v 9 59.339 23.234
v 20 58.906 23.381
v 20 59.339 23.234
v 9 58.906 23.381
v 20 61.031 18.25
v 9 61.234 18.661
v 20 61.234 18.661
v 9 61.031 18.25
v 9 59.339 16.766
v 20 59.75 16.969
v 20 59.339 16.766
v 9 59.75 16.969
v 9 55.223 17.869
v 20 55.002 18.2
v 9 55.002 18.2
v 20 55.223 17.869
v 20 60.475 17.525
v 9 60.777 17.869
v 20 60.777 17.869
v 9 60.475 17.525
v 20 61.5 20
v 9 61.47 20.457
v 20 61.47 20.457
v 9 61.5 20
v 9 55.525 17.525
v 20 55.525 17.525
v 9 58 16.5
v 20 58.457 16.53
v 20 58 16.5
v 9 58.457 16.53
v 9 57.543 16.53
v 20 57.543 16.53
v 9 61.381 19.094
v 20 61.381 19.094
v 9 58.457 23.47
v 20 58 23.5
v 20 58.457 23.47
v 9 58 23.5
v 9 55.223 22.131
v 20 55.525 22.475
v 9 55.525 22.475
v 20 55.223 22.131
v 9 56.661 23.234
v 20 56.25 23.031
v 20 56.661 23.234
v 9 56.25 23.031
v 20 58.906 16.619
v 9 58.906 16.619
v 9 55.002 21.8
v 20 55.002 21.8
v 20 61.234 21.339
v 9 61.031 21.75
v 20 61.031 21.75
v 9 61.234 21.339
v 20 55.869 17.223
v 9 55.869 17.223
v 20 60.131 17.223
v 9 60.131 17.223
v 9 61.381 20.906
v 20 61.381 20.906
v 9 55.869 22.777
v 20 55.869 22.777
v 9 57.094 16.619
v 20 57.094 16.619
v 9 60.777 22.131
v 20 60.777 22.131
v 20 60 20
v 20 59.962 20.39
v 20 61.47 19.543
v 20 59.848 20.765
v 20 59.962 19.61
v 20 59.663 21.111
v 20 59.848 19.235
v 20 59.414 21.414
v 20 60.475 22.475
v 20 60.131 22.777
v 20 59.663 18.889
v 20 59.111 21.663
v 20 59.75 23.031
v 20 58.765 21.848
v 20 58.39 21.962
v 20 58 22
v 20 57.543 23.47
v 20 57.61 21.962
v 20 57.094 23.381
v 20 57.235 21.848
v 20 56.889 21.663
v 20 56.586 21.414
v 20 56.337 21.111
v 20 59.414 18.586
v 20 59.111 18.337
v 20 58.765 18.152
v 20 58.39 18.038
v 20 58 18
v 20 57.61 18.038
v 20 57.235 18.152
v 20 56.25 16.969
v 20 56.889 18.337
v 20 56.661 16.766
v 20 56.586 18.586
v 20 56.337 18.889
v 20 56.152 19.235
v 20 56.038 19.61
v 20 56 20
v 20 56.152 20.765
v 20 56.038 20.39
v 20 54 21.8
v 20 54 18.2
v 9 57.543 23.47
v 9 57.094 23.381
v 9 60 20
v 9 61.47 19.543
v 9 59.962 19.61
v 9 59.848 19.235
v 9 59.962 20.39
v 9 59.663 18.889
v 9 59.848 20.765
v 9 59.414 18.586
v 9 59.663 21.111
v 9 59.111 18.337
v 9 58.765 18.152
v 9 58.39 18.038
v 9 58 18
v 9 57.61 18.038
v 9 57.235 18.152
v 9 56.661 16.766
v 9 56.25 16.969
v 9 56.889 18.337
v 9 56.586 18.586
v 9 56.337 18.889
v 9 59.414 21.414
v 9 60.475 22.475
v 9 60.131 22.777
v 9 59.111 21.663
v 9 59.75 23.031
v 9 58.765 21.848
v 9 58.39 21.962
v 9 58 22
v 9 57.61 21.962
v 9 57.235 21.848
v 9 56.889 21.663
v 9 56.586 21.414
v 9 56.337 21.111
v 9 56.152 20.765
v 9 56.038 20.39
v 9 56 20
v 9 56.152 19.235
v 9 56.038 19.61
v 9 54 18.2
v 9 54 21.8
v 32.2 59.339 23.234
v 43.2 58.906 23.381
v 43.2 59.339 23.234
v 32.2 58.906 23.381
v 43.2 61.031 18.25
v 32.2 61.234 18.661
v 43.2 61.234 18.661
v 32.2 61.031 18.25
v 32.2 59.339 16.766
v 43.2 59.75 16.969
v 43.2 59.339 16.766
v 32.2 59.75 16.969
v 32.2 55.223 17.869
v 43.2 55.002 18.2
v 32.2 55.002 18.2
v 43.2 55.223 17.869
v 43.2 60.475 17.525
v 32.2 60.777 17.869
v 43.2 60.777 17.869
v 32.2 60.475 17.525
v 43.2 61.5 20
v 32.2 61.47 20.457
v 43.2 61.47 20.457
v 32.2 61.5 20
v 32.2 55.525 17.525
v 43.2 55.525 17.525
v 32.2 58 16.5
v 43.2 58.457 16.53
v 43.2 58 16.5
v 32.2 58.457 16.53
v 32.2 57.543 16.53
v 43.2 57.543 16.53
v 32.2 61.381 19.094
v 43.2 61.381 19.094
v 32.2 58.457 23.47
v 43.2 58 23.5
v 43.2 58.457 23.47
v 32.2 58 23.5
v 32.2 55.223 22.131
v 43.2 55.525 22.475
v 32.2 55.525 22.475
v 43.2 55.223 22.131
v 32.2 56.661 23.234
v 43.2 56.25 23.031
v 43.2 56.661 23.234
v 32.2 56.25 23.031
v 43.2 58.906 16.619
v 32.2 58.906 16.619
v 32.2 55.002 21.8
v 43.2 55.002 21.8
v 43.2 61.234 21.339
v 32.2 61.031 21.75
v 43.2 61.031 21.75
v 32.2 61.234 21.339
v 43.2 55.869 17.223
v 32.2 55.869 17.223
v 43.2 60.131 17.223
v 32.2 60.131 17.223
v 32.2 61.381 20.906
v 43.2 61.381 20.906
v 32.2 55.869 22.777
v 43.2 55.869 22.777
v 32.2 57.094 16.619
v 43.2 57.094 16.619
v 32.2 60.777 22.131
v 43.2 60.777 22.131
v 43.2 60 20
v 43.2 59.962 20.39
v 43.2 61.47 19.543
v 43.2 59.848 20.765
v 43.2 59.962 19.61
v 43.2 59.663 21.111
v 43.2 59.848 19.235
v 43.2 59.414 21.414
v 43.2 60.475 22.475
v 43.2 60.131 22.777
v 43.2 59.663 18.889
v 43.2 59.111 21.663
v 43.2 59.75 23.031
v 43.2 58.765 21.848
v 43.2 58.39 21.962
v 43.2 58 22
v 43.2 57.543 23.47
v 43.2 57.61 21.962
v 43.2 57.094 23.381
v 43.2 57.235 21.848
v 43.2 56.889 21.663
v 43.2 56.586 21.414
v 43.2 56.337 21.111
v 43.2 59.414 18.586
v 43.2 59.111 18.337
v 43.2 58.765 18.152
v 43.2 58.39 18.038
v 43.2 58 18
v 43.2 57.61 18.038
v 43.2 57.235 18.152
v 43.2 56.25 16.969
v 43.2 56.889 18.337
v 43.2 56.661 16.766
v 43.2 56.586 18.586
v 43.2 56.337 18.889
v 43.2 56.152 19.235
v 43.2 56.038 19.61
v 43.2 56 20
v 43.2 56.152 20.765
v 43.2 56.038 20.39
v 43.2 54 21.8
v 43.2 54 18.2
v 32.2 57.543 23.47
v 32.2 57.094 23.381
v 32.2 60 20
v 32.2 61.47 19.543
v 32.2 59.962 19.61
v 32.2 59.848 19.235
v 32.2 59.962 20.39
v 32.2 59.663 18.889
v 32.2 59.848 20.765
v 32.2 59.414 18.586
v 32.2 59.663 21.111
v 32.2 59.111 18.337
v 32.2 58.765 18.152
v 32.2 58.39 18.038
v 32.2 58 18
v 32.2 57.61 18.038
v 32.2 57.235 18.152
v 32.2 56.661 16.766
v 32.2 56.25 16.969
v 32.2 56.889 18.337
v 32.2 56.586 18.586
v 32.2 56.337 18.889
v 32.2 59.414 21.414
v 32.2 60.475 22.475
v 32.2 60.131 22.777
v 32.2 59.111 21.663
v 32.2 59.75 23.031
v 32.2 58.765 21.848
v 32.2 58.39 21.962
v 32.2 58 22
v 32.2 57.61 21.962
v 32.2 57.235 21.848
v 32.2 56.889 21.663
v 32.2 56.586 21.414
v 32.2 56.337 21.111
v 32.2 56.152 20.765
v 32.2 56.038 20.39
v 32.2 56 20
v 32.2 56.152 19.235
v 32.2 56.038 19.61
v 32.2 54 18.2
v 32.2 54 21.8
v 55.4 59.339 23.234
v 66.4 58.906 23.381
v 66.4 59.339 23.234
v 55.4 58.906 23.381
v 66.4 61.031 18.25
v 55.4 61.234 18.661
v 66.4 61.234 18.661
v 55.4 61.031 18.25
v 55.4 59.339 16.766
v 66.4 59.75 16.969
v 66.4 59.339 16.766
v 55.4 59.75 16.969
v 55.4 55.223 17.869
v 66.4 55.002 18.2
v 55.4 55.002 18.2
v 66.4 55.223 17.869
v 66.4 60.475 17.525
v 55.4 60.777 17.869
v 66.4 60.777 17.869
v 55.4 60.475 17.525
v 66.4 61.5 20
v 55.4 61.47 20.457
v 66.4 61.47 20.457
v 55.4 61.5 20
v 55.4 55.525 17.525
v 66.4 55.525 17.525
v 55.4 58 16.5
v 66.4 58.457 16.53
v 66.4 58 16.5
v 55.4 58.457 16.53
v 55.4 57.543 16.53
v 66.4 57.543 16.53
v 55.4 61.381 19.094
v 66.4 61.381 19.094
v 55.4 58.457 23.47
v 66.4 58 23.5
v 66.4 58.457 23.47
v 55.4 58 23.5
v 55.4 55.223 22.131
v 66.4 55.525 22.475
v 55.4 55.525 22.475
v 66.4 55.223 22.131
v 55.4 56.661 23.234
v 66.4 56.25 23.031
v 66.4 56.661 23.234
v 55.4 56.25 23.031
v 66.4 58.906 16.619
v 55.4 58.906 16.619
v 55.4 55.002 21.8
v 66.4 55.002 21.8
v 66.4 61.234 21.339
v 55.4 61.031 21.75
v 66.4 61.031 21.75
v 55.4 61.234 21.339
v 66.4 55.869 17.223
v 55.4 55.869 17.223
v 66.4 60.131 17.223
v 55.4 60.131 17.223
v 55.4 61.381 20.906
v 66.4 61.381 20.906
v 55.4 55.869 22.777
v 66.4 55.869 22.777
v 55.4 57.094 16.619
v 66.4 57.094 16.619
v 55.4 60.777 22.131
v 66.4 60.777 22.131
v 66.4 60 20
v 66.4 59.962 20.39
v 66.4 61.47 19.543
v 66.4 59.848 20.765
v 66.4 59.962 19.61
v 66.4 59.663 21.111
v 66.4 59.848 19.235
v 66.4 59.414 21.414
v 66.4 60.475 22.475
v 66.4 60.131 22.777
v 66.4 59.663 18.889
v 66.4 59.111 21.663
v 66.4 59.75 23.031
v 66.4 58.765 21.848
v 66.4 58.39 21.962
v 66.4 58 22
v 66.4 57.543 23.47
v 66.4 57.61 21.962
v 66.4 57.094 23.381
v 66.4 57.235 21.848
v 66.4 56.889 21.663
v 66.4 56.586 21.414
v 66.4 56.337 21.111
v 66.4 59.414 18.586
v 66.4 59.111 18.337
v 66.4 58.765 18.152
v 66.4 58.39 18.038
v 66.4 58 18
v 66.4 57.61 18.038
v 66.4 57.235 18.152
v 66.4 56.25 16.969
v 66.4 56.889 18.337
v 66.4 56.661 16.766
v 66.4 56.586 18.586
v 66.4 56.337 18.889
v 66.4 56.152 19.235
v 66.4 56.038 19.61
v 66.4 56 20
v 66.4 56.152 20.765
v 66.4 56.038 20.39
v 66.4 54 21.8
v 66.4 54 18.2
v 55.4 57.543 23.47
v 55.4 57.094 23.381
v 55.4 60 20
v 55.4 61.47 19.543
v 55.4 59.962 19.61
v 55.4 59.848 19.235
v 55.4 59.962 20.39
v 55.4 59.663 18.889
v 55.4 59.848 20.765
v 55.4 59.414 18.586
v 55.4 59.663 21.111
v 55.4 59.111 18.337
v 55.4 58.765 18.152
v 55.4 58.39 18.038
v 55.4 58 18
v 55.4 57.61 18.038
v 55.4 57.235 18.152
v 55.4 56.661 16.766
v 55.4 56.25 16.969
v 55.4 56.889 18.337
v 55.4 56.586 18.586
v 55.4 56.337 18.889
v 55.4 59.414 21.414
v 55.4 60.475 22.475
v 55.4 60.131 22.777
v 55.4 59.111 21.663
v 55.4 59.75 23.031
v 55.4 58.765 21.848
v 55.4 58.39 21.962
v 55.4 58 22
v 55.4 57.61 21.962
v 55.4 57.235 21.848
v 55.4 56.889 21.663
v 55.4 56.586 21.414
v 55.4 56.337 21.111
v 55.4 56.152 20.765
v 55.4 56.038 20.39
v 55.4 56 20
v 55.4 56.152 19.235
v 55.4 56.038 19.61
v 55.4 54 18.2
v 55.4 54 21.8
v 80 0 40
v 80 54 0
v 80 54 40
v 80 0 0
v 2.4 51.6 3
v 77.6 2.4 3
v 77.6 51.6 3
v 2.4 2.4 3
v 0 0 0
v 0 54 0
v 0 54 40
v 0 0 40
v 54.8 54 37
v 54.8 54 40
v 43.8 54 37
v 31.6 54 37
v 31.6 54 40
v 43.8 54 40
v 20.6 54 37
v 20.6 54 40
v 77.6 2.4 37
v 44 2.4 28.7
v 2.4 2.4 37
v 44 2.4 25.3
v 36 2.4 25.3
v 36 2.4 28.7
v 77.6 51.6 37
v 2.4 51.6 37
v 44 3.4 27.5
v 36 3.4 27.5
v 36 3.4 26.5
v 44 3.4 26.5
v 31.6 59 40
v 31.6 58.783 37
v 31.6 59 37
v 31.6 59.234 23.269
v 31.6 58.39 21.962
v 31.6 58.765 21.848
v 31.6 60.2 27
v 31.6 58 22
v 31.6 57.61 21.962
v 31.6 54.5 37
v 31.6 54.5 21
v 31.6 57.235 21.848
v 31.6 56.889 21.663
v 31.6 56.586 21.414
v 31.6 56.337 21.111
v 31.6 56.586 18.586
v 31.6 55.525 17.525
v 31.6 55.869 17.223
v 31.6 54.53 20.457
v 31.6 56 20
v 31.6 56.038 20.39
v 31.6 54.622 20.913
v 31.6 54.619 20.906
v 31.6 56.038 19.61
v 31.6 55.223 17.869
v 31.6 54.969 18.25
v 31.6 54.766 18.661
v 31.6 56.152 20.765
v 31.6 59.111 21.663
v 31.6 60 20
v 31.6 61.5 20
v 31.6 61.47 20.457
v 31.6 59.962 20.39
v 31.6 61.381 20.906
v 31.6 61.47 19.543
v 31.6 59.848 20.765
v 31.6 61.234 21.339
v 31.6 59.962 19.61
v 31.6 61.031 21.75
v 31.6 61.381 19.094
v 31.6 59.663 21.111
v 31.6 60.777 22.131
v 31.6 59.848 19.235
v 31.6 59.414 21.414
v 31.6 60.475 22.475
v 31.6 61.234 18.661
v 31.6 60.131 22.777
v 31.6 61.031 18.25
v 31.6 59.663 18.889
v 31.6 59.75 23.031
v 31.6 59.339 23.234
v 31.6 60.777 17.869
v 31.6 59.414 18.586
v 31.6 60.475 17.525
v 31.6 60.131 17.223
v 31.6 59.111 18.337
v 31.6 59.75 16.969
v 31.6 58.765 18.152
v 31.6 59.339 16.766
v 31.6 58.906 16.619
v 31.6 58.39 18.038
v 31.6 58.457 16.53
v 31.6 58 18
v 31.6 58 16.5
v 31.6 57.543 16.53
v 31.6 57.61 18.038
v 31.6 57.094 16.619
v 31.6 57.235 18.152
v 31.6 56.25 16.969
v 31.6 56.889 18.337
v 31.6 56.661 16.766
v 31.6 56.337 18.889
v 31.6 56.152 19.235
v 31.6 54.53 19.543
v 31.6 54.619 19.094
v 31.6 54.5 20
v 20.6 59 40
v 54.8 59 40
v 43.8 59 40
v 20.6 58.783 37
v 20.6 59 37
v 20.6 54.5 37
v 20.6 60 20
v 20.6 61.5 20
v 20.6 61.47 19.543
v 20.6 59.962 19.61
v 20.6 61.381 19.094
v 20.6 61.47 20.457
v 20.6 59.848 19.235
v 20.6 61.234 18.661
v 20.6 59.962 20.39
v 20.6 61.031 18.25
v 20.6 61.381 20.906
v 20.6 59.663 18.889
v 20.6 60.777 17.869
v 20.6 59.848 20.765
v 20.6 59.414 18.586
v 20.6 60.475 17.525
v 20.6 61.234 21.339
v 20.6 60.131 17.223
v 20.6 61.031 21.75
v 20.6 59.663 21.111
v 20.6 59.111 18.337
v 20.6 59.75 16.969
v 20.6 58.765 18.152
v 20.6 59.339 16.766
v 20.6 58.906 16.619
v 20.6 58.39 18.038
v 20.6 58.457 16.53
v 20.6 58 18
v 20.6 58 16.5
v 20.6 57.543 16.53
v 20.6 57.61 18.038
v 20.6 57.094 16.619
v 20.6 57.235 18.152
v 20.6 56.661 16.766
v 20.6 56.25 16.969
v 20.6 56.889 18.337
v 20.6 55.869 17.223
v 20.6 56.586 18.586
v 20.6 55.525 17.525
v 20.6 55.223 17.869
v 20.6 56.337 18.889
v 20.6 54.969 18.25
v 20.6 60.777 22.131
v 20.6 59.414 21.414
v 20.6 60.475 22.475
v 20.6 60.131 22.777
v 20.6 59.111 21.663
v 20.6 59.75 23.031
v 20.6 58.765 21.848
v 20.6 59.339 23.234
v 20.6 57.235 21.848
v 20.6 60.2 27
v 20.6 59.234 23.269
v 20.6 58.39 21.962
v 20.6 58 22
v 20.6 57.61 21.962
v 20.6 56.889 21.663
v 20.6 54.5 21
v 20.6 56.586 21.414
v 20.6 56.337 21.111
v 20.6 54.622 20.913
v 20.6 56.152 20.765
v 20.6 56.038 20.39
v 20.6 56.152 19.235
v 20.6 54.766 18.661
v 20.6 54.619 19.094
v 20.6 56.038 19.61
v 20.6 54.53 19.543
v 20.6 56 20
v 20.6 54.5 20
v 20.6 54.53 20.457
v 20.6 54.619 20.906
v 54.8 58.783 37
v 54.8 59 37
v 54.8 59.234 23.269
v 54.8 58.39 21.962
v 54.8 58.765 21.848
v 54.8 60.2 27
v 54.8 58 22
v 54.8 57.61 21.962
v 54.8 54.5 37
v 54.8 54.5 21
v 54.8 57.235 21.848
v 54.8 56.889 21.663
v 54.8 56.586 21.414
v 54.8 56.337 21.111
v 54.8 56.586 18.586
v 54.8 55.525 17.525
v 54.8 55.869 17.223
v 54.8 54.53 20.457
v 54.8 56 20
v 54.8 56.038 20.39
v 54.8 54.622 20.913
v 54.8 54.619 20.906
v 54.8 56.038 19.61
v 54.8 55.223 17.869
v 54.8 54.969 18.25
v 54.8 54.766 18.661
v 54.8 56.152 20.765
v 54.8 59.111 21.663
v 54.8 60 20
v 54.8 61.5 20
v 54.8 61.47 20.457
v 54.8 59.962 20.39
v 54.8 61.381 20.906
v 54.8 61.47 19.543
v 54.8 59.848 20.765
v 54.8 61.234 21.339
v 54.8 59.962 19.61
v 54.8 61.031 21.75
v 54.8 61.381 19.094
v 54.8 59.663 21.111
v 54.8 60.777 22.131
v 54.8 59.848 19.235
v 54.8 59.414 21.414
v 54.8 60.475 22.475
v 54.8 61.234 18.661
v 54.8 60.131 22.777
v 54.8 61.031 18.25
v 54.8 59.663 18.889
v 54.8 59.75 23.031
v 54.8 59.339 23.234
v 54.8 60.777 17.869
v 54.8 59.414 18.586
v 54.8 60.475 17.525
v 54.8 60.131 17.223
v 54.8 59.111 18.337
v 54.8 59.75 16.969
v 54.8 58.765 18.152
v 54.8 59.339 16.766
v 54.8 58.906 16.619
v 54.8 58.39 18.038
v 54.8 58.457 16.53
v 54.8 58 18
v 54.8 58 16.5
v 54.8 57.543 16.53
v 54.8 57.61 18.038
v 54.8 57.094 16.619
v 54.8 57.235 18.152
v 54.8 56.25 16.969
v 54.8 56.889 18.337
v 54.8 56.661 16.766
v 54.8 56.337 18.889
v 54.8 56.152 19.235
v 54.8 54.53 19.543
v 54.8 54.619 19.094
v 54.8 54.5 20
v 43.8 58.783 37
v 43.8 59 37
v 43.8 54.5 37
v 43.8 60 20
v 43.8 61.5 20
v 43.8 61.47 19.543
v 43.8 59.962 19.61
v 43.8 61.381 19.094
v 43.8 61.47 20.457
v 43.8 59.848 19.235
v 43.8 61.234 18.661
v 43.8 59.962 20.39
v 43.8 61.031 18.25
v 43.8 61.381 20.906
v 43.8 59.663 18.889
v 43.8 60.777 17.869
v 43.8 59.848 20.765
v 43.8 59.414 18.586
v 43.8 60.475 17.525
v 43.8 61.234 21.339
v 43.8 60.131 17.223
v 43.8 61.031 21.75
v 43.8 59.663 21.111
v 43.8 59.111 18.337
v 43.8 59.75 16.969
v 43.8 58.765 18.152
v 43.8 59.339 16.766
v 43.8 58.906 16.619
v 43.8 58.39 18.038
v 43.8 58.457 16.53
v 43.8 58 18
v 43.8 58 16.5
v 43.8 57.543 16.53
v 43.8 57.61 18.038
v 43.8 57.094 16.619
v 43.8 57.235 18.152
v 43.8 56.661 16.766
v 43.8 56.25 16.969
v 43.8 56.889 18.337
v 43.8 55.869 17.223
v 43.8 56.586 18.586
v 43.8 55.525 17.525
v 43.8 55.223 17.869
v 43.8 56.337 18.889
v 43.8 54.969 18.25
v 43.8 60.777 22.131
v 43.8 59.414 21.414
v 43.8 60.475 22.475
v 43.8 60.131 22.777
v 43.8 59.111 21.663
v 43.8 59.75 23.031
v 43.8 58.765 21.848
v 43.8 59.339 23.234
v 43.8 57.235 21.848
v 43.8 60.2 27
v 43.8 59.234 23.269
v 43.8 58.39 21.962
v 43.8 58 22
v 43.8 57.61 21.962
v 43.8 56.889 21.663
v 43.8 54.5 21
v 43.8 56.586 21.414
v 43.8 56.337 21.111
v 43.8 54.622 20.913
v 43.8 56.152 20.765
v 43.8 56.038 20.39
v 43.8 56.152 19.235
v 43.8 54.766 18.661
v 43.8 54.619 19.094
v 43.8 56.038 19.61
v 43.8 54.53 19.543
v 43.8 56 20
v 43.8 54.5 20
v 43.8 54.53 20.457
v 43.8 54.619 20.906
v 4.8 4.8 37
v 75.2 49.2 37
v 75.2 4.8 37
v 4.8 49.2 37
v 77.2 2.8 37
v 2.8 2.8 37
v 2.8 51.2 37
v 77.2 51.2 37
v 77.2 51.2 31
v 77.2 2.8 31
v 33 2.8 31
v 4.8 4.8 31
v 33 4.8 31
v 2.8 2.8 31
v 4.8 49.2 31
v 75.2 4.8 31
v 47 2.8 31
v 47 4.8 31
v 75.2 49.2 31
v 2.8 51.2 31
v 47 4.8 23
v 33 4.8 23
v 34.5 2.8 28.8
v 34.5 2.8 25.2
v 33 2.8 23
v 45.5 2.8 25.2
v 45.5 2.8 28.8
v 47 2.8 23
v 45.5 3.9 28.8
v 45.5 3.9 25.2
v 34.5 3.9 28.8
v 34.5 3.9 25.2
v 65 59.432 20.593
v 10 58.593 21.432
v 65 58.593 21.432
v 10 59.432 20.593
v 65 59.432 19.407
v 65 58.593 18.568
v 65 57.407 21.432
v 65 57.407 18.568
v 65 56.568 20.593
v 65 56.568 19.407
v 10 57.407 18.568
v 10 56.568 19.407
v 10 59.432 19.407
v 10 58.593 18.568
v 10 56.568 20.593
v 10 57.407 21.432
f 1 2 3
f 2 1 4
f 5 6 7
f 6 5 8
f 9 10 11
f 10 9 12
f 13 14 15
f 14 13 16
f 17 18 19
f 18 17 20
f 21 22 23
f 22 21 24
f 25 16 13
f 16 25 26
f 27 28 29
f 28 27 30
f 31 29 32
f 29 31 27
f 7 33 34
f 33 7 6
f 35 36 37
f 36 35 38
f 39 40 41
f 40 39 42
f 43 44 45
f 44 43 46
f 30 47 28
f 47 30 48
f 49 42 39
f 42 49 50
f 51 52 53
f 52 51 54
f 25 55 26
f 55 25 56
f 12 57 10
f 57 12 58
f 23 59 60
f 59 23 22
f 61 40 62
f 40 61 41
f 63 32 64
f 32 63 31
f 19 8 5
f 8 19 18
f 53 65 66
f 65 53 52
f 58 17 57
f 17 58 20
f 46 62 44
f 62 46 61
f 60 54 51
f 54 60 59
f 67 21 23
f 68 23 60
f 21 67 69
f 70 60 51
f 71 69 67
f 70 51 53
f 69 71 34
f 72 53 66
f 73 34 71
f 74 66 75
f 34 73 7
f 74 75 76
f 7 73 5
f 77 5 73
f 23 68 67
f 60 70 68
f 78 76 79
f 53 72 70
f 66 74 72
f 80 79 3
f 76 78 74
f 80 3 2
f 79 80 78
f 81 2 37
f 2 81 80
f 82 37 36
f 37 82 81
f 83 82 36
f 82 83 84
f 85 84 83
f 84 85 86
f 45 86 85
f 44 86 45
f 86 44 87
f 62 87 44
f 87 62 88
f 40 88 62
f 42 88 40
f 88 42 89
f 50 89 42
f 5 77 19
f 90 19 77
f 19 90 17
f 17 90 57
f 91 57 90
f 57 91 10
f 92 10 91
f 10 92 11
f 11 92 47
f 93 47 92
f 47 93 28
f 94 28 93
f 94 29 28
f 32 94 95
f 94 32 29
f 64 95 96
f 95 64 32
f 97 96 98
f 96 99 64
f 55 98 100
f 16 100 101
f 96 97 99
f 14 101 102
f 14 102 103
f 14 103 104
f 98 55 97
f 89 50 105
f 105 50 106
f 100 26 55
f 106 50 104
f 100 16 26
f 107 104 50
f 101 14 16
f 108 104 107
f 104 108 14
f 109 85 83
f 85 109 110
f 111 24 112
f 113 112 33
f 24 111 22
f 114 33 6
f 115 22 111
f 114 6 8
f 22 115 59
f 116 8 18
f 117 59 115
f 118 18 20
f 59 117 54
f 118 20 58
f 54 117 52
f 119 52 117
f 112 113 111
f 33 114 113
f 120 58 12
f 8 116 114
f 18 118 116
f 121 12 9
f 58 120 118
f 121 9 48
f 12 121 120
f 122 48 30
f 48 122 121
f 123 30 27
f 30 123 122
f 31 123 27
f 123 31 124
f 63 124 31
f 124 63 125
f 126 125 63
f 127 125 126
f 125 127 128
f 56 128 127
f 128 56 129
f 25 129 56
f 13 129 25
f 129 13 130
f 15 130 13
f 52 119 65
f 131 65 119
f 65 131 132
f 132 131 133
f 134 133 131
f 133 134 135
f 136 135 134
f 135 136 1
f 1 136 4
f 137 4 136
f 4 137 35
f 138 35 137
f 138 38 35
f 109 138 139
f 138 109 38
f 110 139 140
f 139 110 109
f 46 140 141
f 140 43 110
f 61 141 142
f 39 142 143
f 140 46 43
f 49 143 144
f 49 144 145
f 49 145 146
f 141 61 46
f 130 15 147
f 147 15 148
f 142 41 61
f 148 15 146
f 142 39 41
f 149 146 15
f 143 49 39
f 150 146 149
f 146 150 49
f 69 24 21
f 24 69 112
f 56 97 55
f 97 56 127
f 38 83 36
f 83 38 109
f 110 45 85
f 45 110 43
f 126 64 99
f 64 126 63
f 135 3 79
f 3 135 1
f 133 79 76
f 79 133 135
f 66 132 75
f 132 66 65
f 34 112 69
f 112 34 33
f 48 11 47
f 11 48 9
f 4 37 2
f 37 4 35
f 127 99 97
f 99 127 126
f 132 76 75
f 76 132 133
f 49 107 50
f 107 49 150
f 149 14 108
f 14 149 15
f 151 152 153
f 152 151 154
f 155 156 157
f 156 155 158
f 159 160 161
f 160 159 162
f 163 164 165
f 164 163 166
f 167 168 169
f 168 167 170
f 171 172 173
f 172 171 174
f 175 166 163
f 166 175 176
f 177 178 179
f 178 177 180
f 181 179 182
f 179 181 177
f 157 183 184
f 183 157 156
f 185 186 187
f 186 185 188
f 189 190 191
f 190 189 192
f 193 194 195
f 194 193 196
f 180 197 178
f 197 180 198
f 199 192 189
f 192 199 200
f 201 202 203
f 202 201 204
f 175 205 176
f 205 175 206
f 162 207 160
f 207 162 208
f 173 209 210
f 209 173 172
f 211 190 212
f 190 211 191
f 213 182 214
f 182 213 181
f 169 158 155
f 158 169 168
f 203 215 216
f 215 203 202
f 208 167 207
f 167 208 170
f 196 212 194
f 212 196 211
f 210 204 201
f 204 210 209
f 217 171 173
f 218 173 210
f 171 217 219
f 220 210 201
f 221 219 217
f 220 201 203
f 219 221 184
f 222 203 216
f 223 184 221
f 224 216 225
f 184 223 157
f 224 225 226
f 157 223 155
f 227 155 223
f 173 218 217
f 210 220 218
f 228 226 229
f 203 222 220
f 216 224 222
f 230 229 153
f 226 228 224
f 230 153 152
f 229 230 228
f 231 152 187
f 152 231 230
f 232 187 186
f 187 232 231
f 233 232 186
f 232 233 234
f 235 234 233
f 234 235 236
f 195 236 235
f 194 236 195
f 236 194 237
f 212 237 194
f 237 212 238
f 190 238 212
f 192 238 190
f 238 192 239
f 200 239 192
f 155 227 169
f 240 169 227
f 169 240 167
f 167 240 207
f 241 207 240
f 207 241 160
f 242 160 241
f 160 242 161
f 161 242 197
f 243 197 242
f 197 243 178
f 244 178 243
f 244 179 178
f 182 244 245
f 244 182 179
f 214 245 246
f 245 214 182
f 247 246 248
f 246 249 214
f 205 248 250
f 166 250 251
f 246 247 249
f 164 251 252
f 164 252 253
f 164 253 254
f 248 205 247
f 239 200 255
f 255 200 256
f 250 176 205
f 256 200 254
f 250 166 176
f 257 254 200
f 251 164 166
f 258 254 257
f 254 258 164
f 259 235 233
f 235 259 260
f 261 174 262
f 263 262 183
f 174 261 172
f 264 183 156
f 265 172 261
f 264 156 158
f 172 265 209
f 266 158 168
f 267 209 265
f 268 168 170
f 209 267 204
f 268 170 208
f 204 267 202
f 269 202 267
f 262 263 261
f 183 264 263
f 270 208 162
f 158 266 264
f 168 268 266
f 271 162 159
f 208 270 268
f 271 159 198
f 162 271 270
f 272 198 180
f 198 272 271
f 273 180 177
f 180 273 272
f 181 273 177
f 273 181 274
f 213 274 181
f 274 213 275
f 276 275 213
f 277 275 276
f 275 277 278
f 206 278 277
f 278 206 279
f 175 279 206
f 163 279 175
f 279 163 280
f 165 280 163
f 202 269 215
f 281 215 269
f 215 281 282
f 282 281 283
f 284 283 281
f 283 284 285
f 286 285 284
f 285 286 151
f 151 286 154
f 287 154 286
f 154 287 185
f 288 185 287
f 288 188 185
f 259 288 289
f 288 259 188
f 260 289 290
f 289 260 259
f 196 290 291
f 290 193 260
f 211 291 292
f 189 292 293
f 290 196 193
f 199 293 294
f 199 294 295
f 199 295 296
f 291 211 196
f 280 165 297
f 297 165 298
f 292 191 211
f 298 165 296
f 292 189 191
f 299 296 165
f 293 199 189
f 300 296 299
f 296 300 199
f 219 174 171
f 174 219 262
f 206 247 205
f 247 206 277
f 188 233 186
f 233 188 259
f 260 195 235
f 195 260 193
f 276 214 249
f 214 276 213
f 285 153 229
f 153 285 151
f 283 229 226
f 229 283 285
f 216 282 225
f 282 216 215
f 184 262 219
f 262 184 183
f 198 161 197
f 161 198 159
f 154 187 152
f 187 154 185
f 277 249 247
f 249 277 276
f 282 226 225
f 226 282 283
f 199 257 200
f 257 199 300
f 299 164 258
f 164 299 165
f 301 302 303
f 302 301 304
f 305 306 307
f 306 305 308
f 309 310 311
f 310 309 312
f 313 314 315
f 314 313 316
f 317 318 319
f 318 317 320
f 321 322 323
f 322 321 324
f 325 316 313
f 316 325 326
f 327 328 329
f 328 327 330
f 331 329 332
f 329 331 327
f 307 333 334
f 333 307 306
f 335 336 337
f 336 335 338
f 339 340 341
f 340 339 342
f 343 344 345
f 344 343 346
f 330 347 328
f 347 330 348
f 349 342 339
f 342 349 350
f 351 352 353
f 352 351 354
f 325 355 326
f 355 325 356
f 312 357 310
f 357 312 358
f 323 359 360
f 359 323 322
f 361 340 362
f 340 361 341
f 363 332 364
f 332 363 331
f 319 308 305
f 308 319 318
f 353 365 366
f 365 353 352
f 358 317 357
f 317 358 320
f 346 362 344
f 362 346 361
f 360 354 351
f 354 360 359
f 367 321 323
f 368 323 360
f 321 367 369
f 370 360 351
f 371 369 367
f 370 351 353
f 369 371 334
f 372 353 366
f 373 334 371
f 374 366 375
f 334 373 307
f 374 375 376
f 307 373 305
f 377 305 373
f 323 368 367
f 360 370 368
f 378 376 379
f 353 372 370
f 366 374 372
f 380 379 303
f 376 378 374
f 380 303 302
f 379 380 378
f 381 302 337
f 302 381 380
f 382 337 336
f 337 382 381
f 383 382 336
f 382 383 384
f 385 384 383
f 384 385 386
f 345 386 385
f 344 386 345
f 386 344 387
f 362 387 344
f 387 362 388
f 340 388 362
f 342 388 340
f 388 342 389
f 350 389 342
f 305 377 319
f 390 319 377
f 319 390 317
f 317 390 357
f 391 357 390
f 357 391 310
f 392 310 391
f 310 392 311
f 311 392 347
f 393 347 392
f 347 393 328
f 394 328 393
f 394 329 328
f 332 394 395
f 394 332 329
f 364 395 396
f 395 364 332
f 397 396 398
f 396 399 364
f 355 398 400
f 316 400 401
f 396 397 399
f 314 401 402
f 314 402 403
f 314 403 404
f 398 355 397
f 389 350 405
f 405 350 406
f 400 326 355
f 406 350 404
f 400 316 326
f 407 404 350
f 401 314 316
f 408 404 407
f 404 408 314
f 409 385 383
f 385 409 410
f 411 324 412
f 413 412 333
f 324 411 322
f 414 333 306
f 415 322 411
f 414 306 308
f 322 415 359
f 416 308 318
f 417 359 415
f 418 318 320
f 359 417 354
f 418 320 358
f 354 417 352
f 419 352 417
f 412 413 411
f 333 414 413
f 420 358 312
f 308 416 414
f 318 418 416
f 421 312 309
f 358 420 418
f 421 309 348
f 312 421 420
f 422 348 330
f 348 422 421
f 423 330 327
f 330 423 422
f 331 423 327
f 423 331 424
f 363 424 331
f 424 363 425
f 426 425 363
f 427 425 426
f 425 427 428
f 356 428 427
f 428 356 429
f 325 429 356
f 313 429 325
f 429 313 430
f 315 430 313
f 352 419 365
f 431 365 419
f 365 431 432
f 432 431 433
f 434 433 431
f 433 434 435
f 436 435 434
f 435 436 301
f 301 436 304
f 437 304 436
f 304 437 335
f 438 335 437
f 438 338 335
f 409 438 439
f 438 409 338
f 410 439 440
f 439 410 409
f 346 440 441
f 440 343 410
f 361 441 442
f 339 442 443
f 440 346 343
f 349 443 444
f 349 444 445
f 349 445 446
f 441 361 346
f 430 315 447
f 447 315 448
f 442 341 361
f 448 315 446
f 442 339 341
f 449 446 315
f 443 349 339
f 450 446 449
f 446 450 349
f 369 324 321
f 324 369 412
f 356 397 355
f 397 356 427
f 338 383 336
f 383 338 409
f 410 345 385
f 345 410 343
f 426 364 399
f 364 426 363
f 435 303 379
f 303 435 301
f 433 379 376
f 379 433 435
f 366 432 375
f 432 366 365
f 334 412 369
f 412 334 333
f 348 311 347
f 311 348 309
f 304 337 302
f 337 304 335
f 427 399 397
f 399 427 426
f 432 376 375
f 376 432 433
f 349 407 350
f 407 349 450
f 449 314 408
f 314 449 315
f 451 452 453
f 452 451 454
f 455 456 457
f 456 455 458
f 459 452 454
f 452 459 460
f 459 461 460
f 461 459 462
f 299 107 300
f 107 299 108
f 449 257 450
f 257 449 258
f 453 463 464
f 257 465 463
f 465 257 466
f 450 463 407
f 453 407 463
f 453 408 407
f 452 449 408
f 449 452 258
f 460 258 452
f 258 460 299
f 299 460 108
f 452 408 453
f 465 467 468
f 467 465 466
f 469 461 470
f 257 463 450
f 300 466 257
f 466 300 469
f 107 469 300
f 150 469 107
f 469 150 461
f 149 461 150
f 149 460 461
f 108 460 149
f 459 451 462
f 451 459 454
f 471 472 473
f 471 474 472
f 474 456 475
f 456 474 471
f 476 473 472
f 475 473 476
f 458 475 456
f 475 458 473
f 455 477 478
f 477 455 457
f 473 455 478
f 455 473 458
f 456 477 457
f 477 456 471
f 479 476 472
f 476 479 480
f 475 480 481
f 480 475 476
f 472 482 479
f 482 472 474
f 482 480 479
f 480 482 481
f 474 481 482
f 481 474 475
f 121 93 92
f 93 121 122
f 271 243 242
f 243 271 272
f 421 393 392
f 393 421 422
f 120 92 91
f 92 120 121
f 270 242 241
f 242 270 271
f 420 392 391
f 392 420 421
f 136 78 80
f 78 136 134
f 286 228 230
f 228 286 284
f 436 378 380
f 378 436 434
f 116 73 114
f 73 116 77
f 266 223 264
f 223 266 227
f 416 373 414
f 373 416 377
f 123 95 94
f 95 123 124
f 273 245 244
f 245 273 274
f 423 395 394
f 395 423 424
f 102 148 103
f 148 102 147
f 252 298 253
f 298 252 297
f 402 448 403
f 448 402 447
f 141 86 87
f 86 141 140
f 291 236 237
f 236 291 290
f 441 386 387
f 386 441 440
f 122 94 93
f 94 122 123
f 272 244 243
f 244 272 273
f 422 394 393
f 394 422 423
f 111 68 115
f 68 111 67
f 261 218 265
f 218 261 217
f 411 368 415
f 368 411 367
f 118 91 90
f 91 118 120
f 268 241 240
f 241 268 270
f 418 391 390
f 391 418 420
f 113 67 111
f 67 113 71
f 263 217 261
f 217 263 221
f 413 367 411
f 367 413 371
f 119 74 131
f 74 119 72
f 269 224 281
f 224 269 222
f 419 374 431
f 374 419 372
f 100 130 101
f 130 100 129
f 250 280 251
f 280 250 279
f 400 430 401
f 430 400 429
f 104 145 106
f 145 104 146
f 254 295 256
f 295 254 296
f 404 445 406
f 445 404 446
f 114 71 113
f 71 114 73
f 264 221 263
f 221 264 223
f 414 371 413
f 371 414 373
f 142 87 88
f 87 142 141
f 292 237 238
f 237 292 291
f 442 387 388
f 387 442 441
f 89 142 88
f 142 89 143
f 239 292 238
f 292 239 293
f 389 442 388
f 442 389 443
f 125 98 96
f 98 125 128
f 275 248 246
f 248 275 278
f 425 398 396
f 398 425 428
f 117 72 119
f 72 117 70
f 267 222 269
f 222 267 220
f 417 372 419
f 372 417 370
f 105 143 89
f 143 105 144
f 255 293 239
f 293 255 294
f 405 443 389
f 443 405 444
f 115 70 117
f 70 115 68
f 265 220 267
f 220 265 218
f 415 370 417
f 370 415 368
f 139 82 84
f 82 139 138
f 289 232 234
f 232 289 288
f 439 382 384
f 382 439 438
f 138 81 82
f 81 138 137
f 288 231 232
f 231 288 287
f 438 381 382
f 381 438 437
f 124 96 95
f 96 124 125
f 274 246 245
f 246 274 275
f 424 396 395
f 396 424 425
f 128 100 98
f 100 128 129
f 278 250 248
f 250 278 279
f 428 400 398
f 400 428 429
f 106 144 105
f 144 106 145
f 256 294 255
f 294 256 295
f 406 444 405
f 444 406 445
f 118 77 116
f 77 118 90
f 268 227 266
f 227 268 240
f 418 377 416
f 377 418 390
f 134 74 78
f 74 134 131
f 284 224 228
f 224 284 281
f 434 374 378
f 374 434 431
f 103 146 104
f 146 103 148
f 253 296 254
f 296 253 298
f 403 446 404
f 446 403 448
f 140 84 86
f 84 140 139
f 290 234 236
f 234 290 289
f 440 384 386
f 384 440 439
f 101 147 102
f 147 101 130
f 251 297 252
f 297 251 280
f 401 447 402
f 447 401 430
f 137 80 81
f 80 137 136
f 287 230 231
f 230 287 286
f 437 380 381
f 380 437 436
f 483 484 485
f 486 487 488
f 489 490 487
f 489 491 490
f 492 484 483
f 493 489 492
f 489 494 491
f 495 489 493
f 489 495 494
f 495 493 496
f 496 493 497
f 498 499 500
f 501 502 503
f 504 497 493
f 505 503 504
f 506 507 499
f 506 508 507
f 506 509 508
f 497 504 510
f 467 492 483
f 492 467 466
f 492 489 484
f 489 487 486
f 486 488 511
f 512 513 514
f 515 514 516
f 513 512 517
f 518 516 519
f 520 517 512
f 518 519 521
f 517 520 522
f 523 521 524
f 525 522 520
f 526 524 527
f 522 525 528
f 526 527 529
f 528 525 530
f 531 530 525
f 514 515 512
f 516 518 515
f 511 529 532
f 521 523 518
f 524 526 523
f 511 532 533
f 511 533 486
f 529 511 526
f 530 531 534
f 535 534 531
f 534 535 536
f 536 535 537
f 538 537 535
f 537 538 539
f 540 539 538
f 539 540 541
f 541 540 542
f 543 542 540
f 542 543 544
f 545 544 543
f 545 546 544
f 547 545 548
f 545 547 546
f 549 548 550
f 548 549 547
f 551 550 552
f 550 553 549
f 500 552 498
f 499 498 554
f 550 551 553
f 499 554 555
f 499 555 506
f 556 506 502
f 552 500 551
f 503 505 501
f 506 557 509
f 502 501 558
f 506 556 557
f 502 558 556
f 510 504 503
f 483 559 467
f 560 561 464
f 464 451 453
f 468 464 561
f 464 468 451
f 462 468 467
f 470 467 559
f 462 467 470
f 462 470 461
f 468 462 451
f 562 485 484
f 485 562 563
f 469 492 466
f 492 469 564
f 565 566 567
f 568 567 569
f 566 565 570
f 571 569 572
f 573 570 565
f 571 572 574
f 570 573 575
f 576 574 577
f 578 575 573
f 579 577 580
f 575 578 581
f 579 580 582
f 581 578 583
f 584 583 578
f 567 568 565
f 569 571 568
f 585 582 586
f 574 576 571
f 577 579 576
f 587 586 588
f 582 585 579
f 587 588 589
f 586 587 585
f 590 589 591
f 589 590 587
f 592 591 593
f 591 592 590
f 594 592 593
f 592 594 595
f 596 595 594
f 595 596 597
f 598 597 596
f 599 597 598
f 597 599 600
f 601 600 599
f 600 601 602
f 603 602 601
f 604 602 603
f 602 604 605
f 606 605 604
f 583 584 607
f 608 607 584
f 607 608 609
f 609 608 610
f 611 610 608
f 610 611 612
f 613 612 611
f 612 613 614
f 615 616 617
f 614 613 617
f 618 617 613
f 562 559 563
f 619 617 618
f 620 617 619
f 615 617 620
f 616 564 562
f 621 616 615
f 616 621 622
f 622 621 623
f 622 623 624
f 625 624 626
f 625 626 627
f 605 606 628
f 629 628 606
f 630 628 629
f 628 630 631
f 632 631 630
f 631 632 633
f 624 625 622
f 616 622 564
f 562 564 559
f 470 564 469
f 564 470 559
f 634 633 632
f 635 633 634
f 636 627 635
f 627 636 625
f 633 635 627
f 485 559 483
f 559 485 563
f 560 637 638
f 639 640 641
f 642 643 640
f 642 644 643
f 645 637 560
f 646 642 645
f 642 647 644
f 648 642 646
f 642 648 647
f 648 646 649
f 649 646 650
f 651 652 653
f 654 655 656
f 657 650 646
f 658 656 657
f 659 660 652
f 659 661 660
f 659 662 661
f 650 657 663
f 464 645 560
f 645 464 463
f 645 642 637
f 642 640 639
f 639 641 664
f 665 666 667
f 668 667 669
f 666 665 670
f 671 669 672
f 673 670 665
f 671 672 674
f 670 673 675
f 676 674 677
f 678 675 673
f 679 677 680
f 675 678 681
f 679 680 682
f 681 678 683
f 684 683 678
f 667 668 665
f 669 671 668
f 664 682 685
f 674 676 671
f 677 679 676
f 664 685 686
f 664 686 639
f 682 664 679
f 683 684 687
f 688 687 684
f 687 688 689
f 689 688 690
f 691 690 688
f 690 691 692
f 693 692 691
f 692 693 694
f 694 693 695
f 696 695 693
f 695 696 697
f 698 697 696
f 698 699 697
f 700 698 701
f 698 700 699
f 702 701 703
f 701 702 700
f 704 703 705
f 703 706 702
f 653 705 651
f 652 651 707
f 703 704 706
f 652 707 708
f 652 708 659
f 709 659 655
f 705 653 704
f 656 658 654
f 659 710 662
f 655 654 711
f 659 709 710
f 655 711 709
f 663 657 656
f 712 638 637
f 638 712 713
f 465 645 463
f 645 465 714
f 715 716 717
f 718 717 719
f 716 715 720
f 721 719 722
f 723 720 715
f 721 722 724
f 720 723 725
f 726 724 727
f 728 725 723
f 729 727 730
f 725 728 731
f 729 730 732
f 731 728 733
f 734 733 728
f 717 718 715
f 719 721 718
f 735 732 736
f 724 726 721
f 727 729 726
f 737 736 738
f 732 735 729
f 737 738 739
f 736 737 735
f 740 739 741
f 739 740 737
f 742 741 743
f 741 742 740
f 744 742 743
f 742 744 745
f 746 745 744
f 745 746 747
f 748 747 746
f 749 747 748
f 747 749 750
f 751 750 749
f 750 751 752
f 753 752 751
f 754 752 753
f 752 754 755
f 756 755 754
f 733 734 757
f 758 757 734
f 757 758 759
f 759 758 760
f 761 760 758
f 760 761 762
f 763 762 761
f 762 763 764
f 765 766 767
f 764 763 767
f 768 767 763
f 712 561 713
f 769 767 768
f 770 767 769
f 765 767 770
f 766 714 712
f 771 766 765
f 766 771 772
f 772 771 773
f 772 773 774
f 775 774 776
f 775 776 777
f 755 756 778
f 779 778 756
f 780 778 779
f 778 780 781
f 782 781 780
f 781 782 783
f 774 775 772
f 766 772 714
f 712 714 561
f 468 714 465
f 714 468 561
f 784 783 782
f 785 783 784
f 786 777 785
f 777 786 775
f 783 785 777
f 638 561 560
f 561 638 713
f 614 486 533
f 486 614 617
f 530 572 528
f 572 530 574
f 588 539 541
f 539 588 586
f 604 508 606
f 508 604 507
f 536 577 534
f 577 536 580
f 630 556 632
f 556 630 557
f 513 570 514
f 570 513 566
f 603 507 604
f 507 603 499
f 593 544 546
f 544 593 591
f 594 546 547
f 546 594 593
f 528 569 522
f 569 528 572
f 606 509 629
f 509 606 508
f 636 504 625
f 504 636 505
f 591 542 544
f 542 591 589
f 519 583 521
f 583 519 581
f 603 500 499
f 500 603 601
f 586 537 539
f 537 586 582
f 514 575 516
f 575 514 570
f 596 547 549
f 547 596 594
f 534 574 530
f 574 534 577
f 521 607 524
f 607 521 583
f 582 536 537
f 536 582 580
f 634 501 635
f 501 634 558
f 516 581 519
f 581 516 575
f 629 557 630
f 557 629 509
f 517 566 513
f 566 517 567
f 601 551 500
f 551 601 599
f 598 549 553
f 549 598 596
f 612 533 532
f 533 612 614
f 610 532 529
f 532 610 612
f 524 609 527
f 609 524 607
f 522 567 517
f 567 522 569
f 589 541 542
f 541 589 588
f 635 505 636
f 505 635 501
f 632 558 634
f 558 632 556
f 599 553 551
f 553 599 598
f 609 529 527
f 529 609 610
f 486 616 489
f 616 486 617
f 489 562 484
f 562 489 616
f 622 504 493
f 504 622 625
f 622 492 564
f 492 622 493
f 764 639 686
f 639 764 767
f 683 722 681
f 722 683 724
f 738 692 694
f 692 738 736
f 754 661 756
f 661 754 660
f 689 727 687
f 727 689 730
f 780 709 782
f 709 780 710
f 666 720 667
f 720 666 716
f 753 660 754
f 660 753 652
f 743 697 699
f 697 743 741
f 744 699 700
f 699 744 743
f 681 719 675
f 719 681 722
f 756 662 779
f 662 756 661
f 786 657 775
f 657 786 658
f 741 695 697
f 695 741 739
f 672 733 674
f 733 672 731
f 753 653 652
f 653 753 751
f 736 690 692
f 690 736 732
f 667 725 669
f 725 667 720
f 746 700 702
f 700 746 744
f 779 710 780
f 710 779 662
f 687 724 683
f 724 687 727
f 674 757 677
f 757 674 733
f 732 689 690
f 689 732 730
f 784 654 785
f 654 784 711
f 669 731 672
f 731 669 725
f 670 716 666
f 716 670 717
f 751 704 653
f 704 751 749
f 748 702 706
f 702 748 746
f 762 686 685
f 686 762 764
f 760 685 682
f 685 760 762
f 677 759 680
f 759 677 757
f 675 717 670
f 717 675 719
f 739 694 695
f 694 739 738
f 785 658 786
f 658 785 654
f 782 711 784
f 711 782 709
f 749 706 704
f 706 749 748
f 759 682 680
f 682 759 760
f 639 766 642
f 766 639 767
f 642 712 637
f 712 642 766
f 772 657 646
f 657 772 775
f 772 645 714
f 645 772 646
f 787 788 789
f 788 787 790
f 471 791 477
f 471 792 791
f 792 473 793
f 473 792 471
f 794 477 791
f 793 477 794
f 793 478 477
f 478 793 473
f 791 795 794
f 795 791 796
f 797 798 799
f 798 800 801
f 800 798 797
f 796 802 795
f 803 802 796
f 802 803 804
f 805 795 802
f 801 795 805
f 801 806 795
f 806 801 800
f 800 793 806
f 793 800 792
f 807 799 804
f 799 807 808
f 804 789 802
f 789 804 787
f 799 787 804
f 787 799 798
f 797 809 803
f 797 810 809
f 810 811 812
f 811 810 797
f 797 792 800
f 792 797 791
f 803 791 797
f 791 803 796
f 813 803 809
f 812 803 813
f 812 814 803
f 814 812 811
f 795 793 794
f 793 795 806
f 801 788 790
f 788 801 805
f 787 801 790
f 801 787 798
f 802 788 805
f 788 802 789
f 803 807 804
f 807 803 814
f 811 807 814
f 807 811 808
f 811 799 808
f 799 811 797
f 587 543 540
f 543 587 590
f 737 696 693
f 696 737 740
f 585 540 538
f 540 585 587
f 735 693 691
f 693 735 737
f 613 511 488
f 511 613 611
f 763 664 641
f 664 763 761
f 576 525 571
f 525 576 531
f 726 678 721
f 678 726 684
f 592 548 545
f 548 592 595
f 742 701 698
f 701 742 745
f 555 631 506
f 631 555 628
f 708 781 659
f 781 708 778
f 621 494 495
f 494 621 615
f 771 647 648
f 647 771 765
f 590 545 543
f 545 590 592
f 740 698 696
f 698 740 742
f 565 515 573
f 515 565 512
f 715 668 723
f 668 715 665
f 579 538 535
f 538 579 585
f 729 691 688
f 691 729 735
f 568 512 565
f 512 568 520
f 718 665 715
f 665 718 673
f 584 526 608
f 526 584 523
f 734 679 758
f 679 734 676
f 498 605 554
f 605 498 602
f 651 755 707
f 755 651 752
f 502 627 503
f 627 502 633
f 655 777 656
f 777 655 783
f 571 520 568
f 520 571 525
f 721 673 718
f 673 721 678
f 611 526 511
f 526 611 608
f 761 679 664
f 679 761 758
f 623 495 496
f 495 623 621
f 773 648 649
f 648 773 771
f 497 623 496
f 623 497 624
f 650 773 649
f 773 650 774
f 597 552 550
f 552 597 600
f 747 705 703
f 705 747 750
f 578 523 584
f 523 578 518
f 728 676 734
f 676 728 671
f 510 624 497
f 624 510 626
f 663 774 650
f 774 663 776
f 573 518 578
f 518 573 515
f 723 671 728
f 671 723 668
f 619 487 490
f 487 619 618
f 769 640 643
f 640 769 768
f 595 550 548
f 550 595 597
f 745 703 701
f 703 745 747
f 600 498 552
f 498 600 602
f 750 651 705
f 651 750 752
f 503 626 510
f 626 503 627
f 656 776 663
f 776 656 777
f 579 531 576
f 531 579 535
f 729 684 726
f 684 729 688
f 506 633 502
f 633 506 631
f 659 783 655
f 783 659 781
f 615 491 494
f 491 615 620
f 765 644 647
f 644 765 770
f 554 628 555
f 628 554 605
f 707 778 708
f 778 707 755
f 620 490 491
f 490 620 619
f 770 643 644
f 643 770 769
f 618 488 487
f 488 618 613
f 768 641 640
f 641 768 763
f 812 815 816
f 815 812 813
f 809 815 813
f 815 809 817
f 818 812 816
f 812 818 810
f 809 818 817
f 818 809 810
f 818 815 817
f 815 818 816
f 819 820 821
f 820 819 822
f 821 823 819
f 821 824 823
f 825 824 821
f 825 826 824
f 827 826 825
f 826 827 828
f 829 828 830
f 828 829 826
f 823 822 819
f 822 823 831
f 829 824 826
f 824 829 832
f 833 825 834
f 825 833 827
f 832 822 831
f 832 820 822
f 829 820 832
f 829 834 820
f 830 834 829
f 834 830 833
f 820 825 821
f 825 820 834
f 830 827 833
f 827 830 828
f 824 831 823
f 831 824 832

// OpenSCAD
// Box with print-in-place hinge
// Closed body 80 (x) x 54 (y body, 61.5 incl. hinge) x 40 (z) mm.
// Lid occupies the top 10 mm. Hinge pin axis: y=58, z=20 (mid-height at the
// back), so swinging the lid -180 deg about that axis lays the lid flat on
// the bed behind the box: that is the print-in-place pose.
// Clearances (PLA, 0.4 nozzle): pin/bore 0.40 radial, knuckle axial gaps
// 0.6, lid lip to box walls 0.4, lid barrels to box back wall 0.5.

part = "assembly"; // [assembly, box, lid, pin]
cadverify_only = "";

W = 80; D = 54; H = 40; box_h = 30;
wall = 2.4; floor_t = 3; plate_t = 3;
hinge_y = 58; hinge_z = 20;
barrel_r = 3.5; bore_r = 2.0; pin_r = 1.55; cap_r = 2.9;
hinge_ymax = hinge_y + barrel_r;          // 61.5
box_segs  = [[9, 11], [32.2, 11], [55.4, 11]];   // [x0, len]
lid_segs  = [[20.6, 11], [43.8, 11]];
pin_x0 = 10; pin_len = 55;

module instance(name, partname, unit = 1) {
    echo(cadverify_instance = [name, partname, unit]);
    if (cadverify_only == "" || cadverify_only == name) children();
}

// Extrude a (y,z) profile along +x starting at x0, offset by (oy,oz).
module extrude_yz(profile, x0, len, oy = 0, oz = 0) {
    multmatrix([[0,0,1,x0],[1,0,0,oy],[0,1,0,oz],[0,0,0,1]])
        linear_extrude(height = len) polygon(points = profile);
}

module barrel(x0, len) {
    translate([x0, hinge_y, hinge_z]) rotate([0, 90, 0])
        cylinder(h = len, r = barrel_r, $fn = 48);
}

module bore_cut() {
    translate([4, hinge_y, hinge_z]) rotate([0, 90, 0])
        cylinder(h = 72, r = bore_r, $fn = 32);
}

module box_closed() {
    difference() {
        union() {
            // floor and walls up to z=30
            translate([0, 0, 0]) cube([W, D, floor_t]);
            translate([0, 0, floor_t]) cube([W, wall, box_h - floor_t]);              // front
            translate([0, D - wall, floor_t]) cube([W, wall, box_h - floor_t]);       // back
            translate([0, wall, floor_t]) cube([wall, D - 2*wall, box_h - floor_t]);  // left
            translate([W - wall, wall, floor_t]) cube([wall, D - 2*wall, box_h - floor_t]); // right
            // front catch detent bump on the inner front wall (wedged ridge)
            extrude_yz([[2.4,25.3],[3.4,26.5],[3.4,27.5],[2.4,28.7]], 36, 8);
            // hinge knuckles + arms to the back wall
            for (s = box_segs) {
                barrel(s[0], s[1]);
                translate([s[0], 53.5, hinge_z - 1.8]) cube([s[1], 5, 3.6]);
            }
        }
        bore_cut();
    }
}

module lid_closed() {
    difference() {
        union() {
            // top plate + back hinge tabs
            translate([0, 0, H - plate_t]) cube([W, D, plate_t]);
            for (s = lid_segs) translate([s[0], 53, H - plate_t]) cube([s[1], 6, plate_t]);
            // external skirt (down to z=30, flush with box walls outside)
            translate([0, 0, box_h]) cube([W, wall, H - plate_t - box_h]);                  // front
            translate([0, D - wall, box_h]) cube([W, wall, H - plate_t - box_h]);           // back
            translate([0, wall, box_h]) cube([wall, D - 2*wall, H - plate_t - box_h]);      // left
            translate([W - wall, wall, box_h]) cube([wall, D - 2*wall, H - plate_t - box_h]); // right
            // inner sealing lip (0.4 clear of box inner walls)
            translate([2.8, 2.8, 31]) cube([74.4, 2, 6]);        // front lip
            translate([2.8, 49.2, 31]) cube([74.4, 2, 6]);       // back lip
            translate([2.8, 4.8, 31]) cube([2, 44.4, 6]);        // left lip
            translate([75.2, 4.8, 31]) cube([2, 44.4, 6]);       // right lip
            // central catch tongue on the front lip, reaching down to z=23
            translate([33, 2.8, 23]) cube([14, 2, 8]);
            // hinge knuckles + diagonal straps up to the plate tabs
            for (s = lid_segs) {
                barrel(s[0], s[1]);
                extrude_yz([[54.5,39],[58.5,39],[60.2,27],[58,18.5],[54.5,21]], s[0], s[1]);
            }
        }
        bore_cut();
        // catch groove in the tongue (receives the box detent bump when shut)
        translate([34.5, 2.7, 25.2]) cube([11, 1.2, 3.6]);
        // fingernail scoop in the front skirt bottom edge
        translate([40, -1, box_h]) rotate([90, 0, 0]) cylinder(h = 4, r = 4.5, $fn = 32);
    }
}

function oct_pts(r) = [for (i = [0:7]) let (a = 22.5 + 45*i) [r*cos(a), r*sin(a)]];

module pin_closed() {
    // plain octagonal axle (flats top/bottom), ends protrude past the outer knuckles
    extrude_yz(oct_pts(pin_r), pin_x0, pin_len, hinge_y, hinge_z);
}

// --- printed (as-exported) orientations ---
module lid_printed() {
    // closed lid rotated 180 deg about the hinge axis, then dropped to y=0
    translate([0, hinge_ymax, H]) rotate([180, 0, 0]) lid_closed();
}
pin_off = pin_r * cos(22.5); // 1.432 half-height of the octagonal shaft
module pin_printed() {
    translate([-pin_x0, -(hinge_y - pin_off), -(hinge_z - pin_off)]) pin_closed();
}

box_spec = [
    ["bounds", [[0, 0, 0], [W, hinge_ymax, box_h]]],
    ["bodies", 1],
    ["support_faces", [["bed", "-z", 4000]]],
    ["overhangs_allowed", [
        ["hinge barrels and arms: horizontal print-in-place axle housings, bore is self-supported inside the tube", [[8, 53, 16], [67.5, 62, 24]]]
    ]],
    ["copies", 1],
    ["details", [
        ["floor", "material", [[10, 10, 0.5], [70, 44, 2.5]], 0.98],
        ["interior", "void", [[6, 6, 8], [74, 48, 24]], 0.98],
        ["front_wall", "thickness", [40, -1, 15], [0, 1, 0], 2.4],
        ["knuckle_arm", "material", [[10, 53.8, 18.8], [19, 55.8, 21.2]], 0.9],
        ["hinge_bore", "void", [[10, 56.7, 18.7], [19, 59.3, 21.3]], 1.0],
        ["catch_bump", "material", [[37, 2.6, 26.6], [43, 3.3, 27.4]], 0.85],
        ["catch_bump_view", "view", [[35, 2, 24], [45, 4.5, 29.5]]],
        ["hinge_view", "view", [[8, 53, 15], [67, 62, 25]]]
    ]]
];

lid_spec = [
    ["bounds", [[0, 0, 0], [W, hinge_ymax, 23.5]]],
    ["bodies", 1],
    ["support_faces", [["bed", "-z", 4000]]],
    ["overhangs_allowed", [
        ["hinge barrels and straps: horizontal print-in-place axle housings", [[20, 0, 0], [55.5, 8, 24]]],
        ["catch groove underside in print pose", [[34, 56, 11], [46, 59, 15]]]
    ]],
    ["copies", 1],
    ["details", [
        ["top_plate", "material", [[10, 17.5, 0.5], [70, 51.5, 2.5]], 0.98],
        ["front_skirt", "material", [[10, 59.3, 4.5], [70, 61.3, 7.5]], 0.9],
        ["plate_thickness", "thickness", [40, 30, -1], [0, 0, 1], 3],
        ["tongue", "material", [[38, 57, 9.2], [42, 58.5, 10.3]], 0.85],
        ["catch_groove", "void", [[37, 57.7, 12], [43, 58.5, 14]], 1.0],
        ["hinge_bore", "void", [[23, 2.2, 18.7], [29, 4.8, 21.3]], 1.0],
        ["strap", "material", [[23, 3.5, 8], [29, 6.5, 12]], 0.8],
        ["catch_groove_view", "view", [[33, 56.5, 9], [47, 59, 17]]],
        ["lid_knuckle_view", "view", [[20, 0, 16], [32, 8, 24]]]
    ]]
];

pin_spec = [
    ["bounds", [[0, 0, 0], [pin_len, 2*pin_off, 2*pin_off]]],
    ["bodies", 1],
    ["support_faces", [["bed", "-z", 50]]],
    ["overhangs_allowed", [
        ["lower facets of the horizontal print-in-place axle, 0.45 above the bore that supports it", [[-0.1, -0.1, -0.1], [63.1, 3.0, 1.6]]]
    ]],
    ["copies", 1],
    ["details", [
        ["shaft", "material", [[10, 0.9, 0.9], [50, 1.95, 1.95]], 0.9],
        ["shaft_thickness", "thickness", [30, pin_off, -1], [0, 0, 1], 2.865],
        ["pin_end_view", "view", [[0, 0, 0], [3, 2.87, 2.87]]]
    ]]
];

assembly_spec = [
    ["bounds", [[0, 0, 0], [W, hinge_ymax, H]]],
    ["support_faces", [["table", "-z", 4000]]],
    ["motions", [
        ["lid_swing", ["lid"], "rotate", [0, hinge_y, hinge_z], [1, 0, 0], [-180, 0],
            ["flex", [["lid", "box", 1.0, "front catch tongue snaps 0.6 mm over the detent bump while closing"]]]]
    ]],
    ["assembly_order", [
        [["box"], [0, 0, 0]],
        [["lid"], [0, 0, -1], ["rotate", [0, hinge_y, hinge_z], [1, 0, 0], 180]],
        [["pin"], [1, 0, 0]]
    ]],
    ["print_in_place", 0.4],
    ["print_pose", [["lid_swing", -180]]],
    ["overhangs_allowed", [
        ["box hinge barrels in print pose", [[8, 53, 16], [67.5, 62, 24]]],
        ["lid hinge barrels and straps in print pose", [[20, 53, 0], [56, 62, 24]]],
        ["horizontal pin inside its bore, 0.4 above the bore surface", [[5, 55, 16.5], [70.5, 61, 20]]],
        ["lid catch groove in print pose", [[33, 110, 2], [47, 114, 18]]]
    ]]
];

if (part == "box") {
    echo(cadverify_spec = box_spec);
    box_closed();
} else if (part == "lid") {
    echo(cadverify_spec = lid_spec);
    lid_printed();
} else if (part == "pin") {
    echo(cadverify_spec = pin_spec);
    pin_printed();
} else {
    echo(cadverify_spec = assembly_spec);
    instance("box", "box") box_closed();
    instance("lid", "lid")
        translate([0, hinge_ymax, H]) rotate([180, 0, 0]) lid_printed();
    instance("pin", "pin")
        translate([pin_x0, hinge_y - pin_off, hinge_z - pin_off]) pin_printed();
}
